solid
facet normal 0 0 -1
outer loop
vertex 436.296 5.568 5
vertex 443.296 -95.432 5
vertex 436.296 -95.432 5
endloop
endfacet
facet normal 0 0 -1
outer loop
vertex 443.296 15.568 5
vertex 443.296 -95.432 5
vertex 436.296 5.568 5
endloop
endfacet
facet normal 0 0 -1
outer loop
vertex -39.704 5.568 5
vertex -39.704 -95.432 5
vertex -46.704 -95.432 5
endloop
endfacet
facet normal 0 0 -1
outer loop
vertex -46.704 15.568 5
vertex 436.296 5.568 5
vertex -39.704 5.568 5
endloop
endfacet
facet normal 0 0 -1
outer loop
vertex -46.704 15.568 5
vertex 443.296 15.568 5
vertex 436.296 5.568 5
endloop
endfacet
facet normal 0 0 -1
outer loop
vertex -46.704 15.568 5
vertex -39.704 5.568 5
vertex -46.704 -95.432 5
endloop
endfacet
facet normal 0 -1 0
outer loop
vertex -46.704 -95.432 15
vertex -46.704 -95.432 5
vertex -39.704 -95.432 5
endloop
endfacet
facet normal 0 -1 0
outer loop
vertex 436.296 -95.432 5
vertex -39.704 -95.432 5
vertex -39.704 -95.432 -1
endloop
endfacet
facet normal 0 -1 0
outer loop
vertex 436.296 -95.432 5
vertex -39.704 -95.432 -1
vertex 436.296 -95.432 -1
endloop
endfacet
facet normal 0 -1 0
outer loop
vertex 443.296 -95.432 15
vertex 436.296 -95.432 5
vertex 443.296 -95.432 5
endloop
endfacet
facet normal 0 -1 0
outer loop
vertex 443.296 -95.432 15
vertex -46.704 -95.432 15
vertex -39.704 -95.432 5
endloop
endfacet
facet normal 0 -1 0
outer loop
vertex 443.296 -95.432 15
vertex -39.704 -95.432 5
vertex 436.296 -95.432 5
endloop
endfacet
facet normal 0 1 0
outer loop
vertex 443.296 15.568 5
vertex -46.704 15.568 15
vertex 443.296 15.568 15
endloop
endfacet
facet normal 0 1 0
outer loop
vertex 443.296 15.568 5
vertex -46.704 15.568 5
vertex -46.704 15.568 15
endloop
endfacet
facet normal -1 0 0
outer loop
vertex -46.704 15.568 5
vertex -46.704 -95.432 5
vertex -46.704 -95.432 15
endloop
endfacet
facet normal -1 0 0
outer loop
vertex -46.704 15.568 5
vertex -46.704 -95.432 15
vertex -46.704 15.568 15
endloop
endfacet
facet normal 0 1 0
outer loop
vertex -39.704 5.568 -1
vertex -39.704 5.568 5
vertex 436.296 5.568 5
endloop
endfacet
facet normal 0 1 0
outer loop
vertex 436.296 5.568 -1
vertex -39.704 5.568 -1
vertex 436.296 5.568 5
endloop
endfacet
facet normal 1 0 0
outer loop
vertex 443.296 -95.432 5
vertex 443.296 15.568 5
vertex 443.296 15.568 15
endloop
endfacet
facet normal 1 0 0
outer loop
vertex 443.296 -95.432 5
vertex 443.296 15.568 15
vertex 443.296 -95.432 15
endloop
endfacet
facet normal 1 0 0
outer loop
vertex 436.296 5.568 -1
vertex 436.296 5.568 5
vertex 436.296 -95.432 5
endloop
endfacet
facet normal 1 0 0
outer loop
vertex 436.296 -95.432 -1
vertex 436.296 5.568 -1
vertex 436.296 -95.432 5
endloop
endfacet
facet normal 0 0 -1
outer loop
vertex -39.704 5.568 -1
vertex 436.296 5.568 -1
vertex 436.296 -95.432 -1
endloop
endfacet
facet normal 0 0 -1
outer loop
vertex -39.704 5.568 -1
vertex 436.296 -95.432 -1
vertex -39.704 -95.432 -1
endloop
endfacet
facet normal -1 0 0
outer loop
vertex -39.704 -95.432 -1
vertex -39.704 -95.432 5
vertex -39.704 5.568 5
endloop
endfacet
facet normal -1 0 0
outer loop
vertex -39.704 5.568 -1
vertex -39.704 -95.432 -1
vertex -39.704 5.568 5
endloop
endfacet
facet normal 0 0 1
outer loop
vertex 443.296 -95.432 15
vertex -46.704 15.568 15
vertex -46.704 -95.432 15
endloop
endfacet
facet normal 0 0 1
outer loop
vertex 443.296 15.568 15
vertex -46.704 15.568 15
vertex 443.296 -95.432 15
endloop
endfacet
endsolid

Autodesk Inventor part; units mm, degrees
ref_plane "YZ Plane" through (0, 0, 0) normal (1, 0, 0) x (0, 1, 0)
ref_plane "XZ Plane" through (0, 0, 0) normal (0, 1, 0) x (-1, 0, 0)
ref_plane "XY Plane" through (0, 0, 0) normal (0, 0, 1) x (1, 0, 0)
sketch "Sketch1" plane through (0, 0, 0) normal (0, 0, 1) x (1, 0, 0)
  line L0 (-46.7038, 15.5679) -> (443.2962, 15.5679)
  line L1 (443.2962, 15.5679) -> (443.2962, -95.4321)
  line L2 (443.2962, -95.4321) -> (-46.7038, -95.4321)
  line L3 (-46.7038, -95.4321) -> (-46.7038, 15.5679)
  point P0 (0, 0)
  dimension "d0" = 490
  dimension "d1" = 111
extrude "Extrusion1" add sketch "Sketch1" along normal blind 15
sketch "Sketch2" plane through (443.2962, -95.4321, 0) normal (1, 0, 0) x (0, 0, -1)
  line L0 (0, 0) -> (0, 111) projected
  line L1 (0, 111) -> (-5, 111)
  line L2 (-5, 111) -> (-5, 0)
  line L3 (-5, 0) -> (0, 0)
  line L4 (0, 0) -> (0, 111)
  point P0 (0, 95.4321)
  dimension "d4" = 5
  dimension "d5" = 111
extrude "Extrusion2" cut sketch "Sketch2" against normal blind 7
sketch "Sketch3" plane through (-46.7038, -95.4321, 0) normal (-1, 0, 0) x (0, 0, 1)
  line L0 (0, 111) -> (0, 0) projected
  line L1 (0, 111) -> (5, 111)
  line L2 (5, 111) -> (5, 0)
  line L3 (5, 0) -> (0, 0)
  line L4 (0, 0) -> (0, 111)
  point P0 (0, 95.4321)
  dimension "d8" = 5
  dimension "d9" = 111
extrude "Extrusion3" cut sketch "Sketch3" against normal blind 7
sketch "Sketch4" plane through (0, 0, 0) normal (0, 0, -1) x (-1, 0, 0)
  line L0 (-436.2962, 15.5679) -> (-436.2962, -95.4321) projected
  line L1 (-436.2962, 15.5679) -> (39.7038, 15.5679)
  line L2 (39.7038, 15.5679) -> (39.7038, 5.5679)
  line L3 (39.7038, 5.5679) -> (-436.2962, 5.5679)
  line L4 (-436.2962, 5.5679) -> (-436.2962, 15.5679)
  point P0 (0, 0)
  dimension "d12" = 476
  dimension "d13" = 10
extrude "Extrusion4" cut sketch "Sketch4" against normal blind 5
sketch "Sketch5" plane through (0, 0, 0) normal (0, 0, -1) x (-1, 0, 0)
  line L0 (39.7038, 5.5679) -> (-436.2962, 5.5679) projected
  line L1 (-436.2962, 5.5679) -> (-436.2962, -95.4321) projected
  line L2 (39.7038, -95.4321) -> (-436.2962, -95.4321) projected
  line L3 (39.7038, -95.4321) -> (39.7038, 5.5679) projected
  line L4 (-436.2962, -95.4321) -> (-436.2962, 5.5679) projected
  line L5 (39.7038, 5.5679) -> (39.7038, -95.4321) projected
  line L6 (-436.2962, 5.5679) -> (39.7038, 5.5679)
  line L7 (39.7038, 5.5679) -> (39.7038, -95.4321)
  line L8 (39.7038, -95.4321) -> (-436.2962, -95.4321)
  line L9 (-436.2962, -95.4321) -> (-436.2962, 5.5679)
  point P0 (0, 0)
extrude "Extrusion5" add sketch "Sketch5" along normal blind 1
properties part number "Arcade_FrontBottom"
